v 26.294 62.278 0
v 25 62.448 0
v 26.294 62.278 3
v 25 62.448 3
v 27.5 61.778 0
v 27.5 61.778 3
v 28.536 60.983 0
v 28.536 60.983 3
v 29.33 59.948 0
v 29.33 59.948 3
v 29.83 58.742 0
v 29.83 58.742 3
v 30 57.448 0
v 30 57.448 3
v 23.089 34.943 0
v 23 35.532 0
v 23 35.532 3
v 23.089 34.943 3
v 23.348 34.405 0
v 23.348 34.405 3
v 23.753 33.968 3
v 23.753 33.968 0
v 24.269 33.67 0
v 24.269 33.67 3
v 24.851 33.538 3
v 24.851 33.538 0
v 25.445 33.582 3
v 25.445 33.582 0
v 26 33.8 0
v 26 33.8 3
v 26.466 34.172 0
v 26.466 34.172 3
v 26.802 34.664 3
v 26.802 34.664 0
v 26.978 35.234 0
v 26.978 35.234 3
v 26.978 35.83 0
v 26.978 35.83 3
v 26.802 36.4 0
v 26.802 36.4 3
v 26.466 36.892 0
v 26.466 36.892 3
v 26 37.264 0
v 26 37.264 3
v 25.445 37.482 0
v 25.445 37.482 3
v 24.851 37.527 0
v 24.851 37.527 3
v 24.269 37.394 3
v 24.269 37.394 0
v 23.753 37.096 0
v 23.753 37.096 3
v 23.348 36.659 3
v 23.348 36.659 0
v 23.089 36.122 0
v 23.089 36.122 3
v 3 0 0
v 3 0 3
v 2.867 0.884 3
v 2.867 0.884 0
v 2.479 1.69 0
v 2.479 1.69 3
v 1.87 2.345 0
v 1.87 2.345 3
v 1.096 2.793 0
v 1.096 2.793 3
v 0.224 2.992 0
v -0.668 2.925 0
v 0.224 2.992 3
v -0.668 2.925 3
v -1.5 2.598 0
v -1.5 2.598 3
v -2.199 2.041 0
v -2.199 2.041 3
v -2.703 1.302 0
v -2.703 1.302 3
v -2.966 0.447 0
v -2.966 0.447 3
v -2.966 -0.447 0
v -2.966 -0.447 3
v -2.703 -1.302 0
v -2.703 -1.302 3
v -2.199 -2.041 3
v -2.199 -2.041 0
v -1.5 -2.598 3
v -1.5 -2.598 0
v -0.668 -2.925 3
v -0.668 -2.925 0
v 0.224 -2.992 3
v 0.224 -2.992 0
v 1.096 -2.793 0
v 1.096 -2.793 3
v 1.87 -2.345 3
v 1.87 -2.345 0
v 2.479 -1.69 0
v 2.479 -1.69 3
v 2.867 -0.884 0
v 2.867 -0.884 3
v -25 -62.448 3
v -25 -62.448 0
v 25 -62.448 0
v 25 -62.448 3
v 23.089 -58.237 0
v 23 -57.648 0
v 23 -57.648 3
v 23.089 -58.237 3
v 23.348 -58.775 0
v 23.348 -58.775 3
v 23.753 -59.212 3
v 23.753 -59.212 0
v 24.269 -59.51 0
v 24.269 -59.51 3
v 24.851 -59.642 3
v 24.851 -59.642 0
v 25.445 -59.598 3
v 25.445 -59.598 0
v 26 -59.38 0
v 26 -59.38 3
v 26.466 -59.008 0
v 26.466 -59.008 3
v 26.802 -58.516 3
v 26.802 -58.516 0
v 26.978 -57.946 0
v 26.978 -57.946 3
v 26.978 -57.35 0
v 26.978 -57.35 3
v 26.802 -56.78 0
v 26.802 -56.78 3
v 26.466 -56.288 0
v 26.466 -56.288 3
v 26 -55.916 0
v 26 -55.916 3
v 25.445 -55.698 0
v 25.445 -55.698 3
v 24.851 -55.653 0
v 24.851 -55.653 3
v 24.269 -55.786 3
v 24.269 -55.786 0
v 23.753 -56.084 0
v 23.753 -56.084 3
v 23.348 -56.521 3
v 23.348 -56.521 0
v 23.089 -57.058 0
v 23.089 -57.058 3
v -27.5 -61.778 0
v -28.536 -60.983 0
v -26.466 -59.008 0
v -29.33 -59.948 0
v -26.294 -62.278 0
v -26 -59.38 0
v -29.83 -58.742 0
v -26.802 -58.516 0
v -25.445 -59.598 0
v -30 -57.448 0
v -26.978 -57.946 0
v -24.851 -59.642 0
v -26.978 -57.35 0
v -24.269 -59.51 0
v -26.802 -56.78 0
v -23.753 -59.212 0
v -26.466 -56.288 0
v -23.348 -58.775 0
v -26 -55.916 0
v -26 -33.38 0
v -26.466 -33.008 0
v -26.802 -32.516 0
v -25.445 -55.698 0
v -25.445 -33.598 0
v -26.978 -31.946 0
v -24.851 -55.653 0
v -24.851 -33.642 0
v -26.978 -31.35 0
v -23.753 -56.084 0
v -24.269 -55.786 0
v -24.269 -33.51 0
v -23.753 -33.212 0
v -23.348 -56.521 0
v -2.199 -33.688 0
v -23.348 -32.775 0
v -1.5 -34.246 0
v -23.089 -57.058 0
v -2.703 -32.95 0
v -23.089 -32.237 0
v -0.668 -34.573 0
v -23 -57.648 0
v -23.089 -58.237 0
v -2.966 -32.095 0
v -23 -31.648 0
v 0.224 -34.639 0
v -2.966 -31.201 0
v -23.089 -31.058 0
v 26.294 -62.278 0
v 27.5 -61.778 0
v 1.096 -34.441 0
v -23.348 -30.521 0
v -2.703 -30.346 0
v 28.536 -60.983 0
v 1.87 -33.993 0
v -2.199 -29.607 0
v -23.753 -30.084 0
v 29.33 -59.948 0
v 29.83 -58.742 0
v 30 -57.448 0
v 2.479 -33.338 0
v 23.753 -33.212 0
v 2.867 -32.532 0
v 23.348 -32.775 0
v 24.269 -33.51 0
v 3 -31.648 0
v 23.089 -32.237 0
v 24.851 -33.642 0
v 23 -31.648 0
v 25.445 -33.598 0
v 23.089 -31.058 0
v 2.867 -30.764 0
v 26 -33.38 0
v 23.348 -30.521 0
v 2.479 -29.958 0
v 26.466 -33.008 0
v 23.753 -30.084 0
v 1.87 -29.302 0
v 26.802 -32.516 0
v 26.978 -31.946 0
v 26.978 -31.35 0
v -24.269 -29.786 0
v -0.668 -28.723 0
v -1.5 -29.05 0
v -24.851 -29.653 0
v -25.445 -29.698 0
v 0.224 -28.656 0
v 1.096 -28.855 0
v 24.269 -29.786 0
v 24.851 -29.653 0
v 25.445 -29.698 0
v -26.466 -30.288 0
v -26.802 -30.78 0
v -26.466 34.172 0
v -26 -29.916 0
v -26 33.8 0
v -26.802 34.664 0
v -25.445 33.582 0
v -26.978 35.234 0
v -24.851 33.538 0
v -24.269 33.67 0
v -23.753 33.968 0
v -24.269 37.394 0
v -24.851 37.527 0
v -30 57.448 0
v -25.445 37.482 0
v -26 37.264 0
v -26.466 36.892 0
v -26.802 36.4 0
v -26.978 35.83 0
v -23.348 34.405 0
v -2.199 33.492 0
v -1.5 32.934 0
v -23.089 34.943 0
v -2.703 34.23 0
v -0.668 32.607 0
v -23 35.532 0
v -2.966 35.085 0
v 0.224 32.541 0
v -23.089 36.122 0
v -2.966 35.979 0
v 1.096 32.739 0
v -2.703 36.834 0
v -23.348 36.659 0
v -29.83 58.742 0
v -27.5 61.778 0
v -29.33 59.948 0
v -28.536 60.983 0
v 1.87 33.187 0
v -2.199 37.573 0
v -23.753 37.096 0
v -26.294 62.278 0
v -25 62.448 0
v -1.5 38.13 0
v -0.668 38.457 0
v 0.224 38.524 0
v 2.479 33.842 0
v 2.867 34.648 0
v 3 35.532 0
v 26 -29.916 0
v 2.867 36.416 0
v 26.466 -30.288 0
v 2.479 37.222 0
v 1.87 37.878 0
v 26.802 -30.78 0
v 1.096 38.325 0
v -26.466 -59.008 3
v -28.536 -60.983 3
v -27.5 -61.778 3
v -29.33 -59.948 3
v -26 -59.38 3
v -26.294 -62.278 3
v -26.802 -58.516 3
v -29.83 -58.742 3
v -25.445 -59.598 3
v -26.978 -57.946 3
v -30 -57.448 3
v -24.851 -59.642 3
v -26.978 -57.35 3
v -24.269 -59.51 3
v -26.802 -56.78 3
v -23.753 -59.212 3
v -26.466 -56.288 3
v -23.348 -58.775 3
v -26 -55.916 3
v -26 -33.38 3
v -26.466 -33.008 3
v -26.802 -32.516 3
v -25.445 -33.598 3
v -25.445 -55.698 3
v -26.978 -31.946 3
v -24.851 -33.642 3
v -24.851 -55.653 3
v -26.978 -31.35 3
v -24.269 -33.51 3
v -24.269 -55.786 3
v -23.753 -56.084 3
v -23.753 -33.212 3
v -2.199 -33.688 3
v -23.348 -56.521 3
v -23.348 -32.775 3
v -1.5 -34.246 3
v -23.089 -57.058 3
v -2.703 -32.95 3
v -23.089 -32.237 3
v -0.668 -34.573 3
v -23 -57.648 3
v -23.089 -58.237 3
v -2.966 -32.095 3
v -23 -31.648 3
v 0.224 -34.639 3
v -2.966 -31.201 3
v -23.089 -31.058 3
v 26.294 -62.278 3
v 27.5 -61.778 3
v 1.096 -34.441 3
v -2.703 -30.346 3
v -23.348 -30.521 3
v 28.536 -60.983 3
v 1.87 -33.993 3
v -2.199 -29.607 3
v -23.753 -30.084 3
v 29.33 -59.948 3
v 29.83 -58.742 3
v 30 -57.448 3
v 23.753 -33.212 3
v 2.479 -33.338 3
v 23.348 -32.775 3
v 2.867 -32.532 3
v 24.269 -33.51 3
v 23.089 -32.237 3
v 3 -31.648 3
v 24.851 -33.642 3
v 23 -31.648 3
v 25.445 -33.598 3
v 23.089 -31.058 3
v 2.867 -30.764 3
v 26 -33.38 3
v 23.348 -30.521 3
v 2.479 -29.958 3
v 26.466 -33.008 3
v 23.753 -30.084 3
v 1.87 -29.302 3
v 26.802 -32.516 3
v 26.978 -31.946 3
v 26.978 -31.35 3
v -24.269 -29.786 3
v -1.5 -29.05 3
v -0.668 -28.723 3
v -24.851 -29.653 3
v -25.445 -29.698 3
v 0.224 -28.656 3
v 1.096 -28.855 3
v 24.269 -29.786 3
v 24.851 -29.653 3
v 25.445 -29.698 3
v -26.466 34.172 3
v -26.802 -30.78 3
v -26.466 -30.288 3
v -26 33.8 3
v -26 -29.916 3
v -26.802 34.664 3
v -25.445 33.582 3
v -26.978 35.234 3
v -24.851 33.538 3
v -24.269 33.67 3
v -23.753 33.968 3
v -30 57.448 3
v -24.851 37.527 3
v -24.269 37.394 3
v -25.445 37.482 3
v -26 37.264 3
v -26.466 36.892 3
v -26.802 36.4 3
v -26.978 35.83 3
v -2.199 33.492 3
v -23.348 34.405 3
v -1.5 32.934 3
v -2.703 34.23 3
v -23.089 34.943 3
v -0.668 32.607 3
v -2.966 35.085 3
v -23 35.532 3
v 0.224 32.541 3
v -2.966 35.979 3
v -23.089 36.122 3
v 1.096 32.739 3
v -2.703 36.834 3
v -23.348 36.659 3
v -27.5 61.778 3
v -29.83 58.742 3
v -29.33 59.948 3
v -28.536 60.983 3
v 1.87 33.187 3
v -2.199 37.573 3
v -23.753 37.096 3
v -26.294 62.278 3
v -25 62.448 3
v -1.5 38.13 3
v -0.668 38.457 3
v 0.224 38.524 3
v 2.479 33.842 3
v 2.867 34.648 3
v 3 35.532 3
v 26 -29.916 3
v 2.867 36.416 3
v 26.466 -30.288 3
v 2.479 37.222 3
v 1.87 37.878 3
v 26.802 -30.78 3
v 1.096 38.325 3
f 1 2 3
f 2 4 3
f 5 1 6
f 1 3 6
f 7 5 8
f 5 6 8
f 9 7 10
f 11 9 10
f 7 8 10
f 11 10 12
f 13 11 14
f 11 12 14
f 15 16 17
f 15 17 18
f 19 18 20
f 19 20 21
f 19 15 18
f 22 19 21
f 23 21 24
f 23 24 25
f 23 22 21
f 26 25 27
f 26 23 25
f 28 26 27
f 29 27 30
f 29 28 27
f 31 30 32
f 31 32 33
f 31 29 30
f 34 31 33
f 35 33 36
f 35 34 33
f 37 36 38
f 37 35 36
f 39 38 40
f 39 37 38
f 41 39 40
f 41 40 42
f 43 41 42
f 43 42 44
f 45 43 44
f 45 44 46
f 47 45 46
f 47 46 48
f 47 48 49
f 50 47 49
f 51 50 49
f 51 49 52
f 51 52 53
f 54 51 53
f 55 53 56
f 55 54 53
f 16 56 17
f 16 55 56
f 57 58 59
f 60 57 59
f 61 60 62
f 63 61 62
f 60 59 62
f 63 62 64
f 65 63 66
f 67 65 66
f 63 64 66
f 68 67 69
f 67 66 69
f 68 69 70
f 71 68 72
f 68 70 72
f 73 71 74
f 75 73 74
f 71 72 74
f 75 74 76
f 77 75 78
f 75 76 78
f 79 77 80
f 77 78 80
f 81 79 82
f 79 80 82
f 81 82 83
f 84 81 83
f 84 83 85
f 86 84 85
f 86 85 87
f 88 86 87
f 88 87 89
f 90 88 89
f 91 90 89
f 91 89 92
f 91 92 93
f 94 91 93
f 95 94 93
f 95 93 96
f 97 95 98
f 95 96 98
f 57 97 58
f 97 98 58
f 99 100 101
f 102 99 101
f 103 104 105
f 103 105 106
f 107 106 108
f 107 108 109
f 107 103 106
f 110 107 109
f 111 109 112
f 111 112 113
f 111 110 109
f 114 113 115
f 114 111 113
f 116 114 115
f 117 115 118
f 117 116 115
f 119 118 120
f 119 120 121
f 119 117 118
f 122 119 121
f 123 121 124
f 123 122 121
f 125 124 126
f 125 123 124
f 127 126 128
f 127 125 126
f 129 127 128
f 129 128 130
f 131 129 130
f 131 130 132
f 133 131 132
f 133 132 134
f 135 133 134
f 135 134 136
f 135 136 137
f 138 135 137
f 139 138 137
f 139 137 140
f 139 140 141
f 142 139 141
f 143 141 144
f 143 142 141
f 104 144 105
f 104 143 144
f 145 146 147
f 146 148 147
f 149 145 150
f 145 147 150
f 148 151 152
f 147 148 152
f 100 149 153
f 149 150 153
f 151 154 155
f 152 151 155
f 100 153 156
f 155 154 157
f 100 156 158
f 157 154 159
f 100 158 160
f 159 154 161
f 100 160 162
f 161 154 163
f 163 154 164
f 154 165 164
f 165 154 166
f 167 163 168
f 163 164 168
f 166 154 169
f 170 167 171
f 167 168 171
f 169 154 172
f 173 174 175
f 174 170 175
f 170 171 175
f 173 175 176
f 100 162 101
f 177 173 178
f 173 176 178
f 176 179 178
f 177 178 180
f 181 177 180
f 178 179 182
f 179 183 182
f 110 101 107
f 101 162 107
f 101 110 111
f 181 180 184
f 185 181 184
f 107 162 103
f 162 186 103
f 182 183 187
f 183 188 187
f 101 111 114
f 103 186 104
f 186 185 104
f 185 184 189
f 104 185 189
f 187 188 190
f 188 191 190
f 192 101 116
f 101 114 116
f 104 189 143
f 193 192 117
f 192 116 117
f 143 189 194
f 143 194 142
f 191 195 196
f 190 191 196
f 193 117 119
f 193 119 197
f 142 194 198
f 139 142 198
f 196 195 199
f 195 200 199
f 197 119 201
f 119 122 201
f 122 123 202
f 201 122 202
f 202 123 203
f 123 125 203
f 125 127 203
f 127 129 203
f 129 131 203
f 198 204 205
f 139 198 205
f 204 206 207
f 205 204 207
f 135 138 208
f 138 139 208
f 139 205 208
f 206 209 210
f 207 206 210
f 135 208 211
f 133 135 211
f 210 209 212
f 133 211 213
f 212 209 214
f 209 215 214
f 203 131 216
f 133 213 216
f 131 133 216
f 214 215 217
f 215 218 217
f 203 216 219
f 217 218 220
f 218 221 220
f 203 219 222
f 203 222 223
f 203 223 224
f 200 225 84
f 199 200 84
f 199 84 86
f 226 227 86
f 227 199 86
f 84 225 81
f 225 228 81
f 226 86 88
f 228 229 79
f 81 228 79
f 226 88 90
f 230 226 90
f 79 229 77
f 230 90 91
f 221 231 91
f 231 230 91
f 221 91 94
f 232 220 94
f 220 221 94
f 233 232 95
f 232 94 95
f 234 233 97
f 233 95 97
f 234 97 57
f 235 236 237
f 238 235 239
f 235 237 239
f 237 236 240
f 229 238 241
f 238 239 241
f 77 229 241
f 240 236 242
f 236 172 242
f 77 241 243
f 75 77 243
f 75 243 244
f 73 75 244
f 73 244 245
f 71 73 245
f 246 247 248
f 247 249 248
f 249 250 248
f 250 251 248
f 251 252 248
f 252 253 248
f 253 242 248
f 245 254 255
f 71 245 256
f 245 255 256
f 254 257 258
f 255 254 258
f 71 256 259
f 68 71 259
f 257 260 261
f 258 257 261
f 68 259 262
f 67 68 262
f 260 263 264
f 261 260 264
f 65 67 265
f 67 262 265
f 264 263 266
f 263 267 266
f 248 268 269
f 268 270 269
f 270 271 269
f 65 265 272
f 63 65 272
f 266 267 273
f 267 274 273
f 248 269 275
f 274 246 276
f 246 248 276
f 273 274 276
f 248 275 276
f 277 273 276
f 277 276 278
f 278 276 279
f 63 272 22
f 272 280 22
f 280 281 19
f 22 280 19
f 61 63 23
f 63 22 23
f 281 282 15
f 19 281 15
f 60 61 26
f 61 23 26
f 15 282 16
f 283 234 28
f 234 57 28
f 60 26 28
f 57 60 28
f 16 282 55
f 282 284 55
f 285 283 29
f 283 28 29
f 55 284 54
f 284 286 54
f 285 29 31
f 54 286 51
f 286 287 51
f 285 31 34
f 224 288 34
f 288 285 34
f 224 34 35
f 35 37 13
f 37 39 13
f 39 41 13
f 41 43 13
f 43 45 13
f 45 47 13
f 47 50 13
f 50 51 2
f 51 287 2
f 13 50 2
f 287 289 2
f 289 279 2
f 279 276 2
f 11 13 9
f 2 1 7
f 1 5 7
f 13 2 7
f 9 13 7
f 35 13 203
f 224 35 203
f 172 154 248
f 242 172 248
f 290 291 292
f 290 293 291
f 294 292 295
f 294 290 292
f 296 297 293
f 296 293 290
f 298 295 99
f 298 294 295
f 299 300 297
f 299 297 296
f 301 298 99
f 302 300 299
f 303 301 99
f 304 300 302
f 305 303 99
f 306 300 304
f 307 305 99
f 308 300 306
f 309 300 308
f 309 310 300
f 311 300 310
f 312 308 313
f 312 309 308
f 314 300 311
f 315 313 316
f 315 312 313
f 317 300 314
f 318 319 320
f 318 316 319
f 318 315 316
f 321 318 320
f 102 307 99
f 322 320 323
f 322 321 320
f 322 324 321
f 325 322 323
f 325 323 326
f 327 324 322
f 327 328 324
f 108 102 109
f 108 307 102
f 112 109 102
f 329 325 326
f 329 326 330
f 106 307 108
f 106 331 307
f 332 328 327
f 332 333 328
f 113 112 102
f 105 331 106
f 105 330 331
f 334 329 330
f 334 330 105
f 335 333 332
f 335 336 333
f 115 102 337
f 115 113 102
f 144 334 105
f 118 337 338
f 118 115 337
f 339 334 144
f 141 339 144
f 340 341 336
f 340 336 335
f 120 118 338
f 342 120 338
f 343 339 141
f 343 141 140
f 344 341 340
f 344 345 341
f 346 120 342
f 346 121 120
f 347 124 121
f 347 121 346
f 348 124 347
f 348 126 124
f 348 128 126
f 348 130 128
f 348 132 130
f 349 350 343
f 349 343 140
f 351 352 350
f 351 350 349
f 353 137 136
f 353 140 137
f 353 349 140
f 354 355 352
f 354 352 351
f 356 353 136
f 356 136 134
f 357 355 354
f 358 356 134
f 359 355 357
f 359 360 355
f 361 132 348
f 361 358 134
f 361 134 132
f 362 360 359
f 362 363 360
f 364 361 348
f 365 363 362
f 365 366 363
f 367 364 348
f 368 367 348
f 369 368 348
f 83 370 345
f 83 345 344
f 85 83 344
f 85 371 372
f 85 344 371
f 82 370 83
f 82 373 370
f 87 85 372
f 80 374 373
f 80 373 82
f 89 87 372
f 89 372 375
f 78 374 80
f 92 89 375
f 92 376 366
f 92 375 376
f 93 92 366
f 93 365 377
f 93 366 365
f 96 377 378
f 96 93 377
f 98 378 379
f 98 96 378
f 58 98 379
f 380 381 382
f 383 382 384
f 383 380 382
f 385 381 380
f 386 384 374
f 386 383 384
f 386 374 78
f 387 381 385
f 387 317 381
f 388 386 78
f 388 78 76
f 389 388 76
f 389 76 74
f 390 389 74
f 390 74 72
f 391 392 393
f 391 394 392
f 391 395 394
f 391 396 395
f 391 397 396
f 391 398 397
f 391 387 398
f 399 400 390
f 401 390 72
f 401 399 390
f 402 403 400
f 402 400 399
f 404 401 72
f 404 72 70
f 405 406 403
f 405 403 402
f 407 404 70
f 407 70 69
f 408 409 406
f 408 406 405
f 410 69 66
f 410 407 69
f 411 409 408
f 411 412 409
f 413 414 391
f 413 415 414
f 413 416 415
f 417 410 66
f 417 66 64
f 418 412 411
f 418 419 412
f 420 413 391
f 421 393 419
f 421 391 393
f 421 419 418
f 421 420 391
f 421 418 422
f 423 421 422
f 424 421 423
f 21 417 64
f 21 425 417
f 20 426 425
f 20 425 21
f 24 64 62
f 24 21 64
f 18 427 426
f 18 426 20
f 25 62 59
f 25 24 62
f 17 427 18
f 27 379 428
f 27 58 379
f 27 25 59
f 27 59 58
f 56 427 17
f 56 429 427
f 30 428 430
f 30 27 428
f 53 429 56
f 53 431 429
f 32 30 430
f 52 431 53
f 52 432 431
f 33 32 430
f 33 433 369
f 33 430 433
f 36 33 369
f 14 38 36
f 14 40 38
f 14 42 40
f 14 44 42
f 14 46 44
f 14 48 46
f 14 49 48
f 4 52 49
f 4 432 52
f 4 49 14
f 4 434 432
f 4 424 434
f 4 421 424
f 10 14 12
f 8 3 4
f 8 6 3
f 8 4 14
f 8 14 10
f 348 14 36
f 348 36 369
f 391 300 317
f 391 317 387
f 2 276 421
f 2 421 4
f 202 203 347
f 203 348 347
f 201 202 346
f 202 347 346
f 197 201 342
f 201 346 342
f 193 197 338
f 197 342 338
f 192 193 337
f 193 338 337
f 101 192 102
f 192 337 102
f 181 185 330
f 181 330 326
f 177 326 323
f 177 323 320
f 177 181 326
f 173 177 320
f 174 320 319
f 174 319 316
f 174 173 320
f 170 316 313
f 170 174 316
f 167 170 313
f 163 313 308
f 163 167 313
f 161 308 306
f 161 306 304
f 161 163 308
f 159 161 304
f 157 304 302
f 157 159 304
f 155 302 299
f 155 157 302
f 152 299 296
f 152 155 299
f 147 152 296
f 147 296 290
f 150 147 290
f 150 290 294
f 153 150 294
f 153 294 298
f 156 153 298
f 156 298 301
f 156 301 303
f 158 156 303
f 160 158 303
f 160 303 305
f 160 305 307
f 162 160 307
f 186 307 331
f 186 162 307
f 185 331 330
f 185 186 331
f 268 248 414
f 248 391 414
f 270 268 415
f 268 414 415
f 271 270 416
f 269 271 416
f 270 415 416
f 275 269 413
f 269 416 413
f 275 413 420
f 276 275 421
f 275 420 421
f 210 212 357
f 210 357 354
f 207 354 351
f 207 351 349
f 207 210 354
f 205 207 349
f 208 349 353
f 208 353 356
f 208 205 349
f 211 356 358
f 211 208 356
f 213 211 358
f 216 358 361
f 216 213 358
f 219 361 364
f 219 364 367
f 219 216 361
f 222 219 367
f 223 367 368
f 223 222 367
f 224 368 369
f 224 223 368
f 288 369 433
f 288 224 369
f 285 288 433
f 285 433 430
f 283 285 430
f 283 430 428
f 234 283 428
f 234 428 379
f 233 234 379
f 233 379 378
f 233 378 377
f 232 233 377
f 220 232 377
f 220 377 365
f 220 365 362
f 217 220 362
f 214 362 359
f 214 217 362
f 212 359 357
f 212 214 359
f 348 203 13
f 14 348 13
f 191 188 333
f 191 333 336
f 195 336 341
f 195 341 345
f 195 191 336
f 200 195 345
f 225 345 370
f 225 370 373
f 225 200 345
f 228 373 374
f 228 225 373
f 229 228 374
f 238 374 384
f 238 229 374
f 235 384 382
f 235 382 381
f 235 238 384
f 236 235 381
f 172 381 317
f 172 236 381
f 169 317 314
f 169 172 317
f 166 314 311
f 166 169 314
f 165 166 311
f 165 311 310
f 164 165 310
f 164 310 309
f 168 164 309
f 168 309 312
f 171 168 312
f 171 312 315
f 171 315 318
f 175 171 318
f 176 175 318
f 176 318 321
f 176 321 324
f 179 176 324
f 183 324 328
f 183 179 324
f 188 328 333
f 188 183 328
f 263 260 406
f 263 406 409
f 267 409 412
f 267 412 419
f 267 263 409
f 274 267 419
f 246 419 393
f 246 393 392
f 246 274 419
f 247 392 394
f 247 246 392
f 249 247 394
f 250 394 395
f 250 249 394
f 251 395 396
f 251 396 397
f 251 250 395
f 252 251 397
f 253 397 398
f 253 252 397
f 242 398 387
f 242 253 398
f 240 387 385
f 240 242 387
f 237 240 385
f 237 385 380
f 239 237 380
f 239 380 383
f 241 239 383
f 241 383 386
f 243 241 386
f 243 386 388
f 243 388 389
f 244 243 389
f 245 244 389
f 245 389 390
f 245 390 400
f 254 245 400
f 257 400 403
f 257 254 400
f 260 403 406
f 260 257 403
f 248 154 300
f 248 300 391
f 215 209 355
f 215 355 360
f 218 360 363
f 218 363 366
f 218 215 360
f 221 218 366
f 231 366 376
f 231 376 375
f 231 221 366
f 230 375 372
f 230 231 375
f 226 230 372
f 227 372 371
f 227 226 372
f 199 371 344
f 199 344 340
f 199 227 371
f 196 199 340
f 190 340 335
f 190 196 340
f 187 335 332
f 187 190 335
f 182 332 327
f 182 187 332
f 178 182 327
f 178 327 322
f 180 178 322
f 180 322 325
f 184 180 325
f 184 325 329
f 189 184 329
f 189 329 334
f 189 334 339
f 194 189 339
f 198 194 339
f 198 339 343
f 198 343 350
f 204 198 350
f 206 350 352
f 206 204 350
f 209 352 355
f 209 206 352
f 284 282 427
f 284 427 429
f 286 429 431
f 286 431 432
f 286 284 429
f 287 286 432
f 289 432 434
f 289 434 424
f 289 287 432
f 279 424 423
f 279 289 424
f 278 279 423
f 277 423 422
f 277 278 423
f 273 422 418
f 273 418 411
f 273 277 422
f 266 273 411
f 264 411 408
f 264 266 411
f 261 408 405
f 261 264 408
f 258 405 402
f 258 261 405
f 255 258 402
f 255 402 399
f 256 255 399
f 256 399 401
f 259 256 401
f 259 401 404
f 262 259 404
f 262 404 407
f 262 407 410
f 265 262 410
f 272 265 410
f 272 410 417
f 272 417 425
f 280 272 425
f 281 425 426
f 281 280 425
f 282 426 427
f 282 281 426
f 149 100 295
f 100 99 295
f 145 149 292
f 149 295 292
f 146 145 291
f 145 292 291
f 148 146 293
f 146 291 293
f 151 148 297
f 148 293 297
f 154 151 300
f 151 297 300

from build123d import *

# Parameters (mm, degrees)
SKETCH_1_W          = 60
SKETCH_1_H          = 124.895763786
SKETCH_1_R          = 2
SKETCH_1_R_2        = 3
EXTRUDE_1_DEPTH     = 3
FILLET_2_R          = 5
FILLET_3_R          = 5
FILLET_4_R          = 5
FILLET_5_R          = 5
SKETCH_2_R          = 3
CUT_EXTRUDE_1_DEPTH = 3


with BuildPart() as part:
    # Эскиз1 → Бобышка-Вытянуть1 (new body)
    with BuildSketch(Plane.XY):
        Rectangle(SKETCH_1_W, SKETCH_1_H)
        with Locations((-25, -57.647881893)):
            Circle(SKETCH_1_R, mode=Mode.SUBTRACT)
        with Locations((-25, -31.647881893)):
            Circle(SKETCH_1_R, mode=Mode.SUBTRACT)
        with Locations((-25, 35.532118107)):
            Circle(SKETCH_1_R, mode=Mode.SUBTRACT)
        with Locations((0, -31.647881893)):
            Circle(SKETCH_1_R_2, mode=Mode.SUBTRACT)
        with Locations((0, 35.532118107)):
            Circle(SKETCH_1_R_2, mode=Mode.SUBTRACT)
        with Locations(Location((25, 35.532118107, 0), (0, 0, 180))):
            Circle(SKETCH_1_R, mode=Mode.SUBTRACT)
        with Locations(Location((25, -31.647881893, 0), (0, 0, 180))):
            Circle(SKETCH_1_R, mode=Mode.SUBTRACT)
        with Locations(Location((25, -57.647881893, 0), (0, 0, 180))):
            Circle(SKETCH_1_R, mode=Mode.SUBTRACT)
    extrude(amount=EXTRUDE_1_DEPTH)

    # Скругление2
    fillet_2_edges = [part.edges().sort_by_distance(p)[0] for p in [
        (-30, 62.447881893, 1.5),
    ]]
    fillet(fillet_2_edges, radius=FILLET_2_R)

    # Скругление3
    fillet_3_edges = [part.edges().sort_by_distance(p)[0] for p in [
        (30, 62.447881893, 1.5),
    ]]
    fillet(fillet_3_edges, radius=FILLET_3_R)

    # Скругление4
    fillet_4_edges = [part.edges().sort_by_distance(p)[0] for p in [
        (30, -62.447881893, 1.5),
    ]]
    fillet(fillet_4_edges, radius=FILLET_4_R)

    # Скругление5
    fillet_5_edges = [part.edges().sort_by_distance(p)[0] for p in [
        (-30, -62.447881893, 1.5),
    ]]
    fillet(fillet_5_edges, radius=FILLET_5_R)

    # Эскиз2 → Вырез-Вытянуть1 (cut)
    with BuildSketch(Plane.XY.offset(3)):
        Circle(SKETCH_2_R)
    extrude(amount=-CUT_EXTRUDE_1_DEPTH, mode=Mode.SUBTRACT)


solid = part.part
